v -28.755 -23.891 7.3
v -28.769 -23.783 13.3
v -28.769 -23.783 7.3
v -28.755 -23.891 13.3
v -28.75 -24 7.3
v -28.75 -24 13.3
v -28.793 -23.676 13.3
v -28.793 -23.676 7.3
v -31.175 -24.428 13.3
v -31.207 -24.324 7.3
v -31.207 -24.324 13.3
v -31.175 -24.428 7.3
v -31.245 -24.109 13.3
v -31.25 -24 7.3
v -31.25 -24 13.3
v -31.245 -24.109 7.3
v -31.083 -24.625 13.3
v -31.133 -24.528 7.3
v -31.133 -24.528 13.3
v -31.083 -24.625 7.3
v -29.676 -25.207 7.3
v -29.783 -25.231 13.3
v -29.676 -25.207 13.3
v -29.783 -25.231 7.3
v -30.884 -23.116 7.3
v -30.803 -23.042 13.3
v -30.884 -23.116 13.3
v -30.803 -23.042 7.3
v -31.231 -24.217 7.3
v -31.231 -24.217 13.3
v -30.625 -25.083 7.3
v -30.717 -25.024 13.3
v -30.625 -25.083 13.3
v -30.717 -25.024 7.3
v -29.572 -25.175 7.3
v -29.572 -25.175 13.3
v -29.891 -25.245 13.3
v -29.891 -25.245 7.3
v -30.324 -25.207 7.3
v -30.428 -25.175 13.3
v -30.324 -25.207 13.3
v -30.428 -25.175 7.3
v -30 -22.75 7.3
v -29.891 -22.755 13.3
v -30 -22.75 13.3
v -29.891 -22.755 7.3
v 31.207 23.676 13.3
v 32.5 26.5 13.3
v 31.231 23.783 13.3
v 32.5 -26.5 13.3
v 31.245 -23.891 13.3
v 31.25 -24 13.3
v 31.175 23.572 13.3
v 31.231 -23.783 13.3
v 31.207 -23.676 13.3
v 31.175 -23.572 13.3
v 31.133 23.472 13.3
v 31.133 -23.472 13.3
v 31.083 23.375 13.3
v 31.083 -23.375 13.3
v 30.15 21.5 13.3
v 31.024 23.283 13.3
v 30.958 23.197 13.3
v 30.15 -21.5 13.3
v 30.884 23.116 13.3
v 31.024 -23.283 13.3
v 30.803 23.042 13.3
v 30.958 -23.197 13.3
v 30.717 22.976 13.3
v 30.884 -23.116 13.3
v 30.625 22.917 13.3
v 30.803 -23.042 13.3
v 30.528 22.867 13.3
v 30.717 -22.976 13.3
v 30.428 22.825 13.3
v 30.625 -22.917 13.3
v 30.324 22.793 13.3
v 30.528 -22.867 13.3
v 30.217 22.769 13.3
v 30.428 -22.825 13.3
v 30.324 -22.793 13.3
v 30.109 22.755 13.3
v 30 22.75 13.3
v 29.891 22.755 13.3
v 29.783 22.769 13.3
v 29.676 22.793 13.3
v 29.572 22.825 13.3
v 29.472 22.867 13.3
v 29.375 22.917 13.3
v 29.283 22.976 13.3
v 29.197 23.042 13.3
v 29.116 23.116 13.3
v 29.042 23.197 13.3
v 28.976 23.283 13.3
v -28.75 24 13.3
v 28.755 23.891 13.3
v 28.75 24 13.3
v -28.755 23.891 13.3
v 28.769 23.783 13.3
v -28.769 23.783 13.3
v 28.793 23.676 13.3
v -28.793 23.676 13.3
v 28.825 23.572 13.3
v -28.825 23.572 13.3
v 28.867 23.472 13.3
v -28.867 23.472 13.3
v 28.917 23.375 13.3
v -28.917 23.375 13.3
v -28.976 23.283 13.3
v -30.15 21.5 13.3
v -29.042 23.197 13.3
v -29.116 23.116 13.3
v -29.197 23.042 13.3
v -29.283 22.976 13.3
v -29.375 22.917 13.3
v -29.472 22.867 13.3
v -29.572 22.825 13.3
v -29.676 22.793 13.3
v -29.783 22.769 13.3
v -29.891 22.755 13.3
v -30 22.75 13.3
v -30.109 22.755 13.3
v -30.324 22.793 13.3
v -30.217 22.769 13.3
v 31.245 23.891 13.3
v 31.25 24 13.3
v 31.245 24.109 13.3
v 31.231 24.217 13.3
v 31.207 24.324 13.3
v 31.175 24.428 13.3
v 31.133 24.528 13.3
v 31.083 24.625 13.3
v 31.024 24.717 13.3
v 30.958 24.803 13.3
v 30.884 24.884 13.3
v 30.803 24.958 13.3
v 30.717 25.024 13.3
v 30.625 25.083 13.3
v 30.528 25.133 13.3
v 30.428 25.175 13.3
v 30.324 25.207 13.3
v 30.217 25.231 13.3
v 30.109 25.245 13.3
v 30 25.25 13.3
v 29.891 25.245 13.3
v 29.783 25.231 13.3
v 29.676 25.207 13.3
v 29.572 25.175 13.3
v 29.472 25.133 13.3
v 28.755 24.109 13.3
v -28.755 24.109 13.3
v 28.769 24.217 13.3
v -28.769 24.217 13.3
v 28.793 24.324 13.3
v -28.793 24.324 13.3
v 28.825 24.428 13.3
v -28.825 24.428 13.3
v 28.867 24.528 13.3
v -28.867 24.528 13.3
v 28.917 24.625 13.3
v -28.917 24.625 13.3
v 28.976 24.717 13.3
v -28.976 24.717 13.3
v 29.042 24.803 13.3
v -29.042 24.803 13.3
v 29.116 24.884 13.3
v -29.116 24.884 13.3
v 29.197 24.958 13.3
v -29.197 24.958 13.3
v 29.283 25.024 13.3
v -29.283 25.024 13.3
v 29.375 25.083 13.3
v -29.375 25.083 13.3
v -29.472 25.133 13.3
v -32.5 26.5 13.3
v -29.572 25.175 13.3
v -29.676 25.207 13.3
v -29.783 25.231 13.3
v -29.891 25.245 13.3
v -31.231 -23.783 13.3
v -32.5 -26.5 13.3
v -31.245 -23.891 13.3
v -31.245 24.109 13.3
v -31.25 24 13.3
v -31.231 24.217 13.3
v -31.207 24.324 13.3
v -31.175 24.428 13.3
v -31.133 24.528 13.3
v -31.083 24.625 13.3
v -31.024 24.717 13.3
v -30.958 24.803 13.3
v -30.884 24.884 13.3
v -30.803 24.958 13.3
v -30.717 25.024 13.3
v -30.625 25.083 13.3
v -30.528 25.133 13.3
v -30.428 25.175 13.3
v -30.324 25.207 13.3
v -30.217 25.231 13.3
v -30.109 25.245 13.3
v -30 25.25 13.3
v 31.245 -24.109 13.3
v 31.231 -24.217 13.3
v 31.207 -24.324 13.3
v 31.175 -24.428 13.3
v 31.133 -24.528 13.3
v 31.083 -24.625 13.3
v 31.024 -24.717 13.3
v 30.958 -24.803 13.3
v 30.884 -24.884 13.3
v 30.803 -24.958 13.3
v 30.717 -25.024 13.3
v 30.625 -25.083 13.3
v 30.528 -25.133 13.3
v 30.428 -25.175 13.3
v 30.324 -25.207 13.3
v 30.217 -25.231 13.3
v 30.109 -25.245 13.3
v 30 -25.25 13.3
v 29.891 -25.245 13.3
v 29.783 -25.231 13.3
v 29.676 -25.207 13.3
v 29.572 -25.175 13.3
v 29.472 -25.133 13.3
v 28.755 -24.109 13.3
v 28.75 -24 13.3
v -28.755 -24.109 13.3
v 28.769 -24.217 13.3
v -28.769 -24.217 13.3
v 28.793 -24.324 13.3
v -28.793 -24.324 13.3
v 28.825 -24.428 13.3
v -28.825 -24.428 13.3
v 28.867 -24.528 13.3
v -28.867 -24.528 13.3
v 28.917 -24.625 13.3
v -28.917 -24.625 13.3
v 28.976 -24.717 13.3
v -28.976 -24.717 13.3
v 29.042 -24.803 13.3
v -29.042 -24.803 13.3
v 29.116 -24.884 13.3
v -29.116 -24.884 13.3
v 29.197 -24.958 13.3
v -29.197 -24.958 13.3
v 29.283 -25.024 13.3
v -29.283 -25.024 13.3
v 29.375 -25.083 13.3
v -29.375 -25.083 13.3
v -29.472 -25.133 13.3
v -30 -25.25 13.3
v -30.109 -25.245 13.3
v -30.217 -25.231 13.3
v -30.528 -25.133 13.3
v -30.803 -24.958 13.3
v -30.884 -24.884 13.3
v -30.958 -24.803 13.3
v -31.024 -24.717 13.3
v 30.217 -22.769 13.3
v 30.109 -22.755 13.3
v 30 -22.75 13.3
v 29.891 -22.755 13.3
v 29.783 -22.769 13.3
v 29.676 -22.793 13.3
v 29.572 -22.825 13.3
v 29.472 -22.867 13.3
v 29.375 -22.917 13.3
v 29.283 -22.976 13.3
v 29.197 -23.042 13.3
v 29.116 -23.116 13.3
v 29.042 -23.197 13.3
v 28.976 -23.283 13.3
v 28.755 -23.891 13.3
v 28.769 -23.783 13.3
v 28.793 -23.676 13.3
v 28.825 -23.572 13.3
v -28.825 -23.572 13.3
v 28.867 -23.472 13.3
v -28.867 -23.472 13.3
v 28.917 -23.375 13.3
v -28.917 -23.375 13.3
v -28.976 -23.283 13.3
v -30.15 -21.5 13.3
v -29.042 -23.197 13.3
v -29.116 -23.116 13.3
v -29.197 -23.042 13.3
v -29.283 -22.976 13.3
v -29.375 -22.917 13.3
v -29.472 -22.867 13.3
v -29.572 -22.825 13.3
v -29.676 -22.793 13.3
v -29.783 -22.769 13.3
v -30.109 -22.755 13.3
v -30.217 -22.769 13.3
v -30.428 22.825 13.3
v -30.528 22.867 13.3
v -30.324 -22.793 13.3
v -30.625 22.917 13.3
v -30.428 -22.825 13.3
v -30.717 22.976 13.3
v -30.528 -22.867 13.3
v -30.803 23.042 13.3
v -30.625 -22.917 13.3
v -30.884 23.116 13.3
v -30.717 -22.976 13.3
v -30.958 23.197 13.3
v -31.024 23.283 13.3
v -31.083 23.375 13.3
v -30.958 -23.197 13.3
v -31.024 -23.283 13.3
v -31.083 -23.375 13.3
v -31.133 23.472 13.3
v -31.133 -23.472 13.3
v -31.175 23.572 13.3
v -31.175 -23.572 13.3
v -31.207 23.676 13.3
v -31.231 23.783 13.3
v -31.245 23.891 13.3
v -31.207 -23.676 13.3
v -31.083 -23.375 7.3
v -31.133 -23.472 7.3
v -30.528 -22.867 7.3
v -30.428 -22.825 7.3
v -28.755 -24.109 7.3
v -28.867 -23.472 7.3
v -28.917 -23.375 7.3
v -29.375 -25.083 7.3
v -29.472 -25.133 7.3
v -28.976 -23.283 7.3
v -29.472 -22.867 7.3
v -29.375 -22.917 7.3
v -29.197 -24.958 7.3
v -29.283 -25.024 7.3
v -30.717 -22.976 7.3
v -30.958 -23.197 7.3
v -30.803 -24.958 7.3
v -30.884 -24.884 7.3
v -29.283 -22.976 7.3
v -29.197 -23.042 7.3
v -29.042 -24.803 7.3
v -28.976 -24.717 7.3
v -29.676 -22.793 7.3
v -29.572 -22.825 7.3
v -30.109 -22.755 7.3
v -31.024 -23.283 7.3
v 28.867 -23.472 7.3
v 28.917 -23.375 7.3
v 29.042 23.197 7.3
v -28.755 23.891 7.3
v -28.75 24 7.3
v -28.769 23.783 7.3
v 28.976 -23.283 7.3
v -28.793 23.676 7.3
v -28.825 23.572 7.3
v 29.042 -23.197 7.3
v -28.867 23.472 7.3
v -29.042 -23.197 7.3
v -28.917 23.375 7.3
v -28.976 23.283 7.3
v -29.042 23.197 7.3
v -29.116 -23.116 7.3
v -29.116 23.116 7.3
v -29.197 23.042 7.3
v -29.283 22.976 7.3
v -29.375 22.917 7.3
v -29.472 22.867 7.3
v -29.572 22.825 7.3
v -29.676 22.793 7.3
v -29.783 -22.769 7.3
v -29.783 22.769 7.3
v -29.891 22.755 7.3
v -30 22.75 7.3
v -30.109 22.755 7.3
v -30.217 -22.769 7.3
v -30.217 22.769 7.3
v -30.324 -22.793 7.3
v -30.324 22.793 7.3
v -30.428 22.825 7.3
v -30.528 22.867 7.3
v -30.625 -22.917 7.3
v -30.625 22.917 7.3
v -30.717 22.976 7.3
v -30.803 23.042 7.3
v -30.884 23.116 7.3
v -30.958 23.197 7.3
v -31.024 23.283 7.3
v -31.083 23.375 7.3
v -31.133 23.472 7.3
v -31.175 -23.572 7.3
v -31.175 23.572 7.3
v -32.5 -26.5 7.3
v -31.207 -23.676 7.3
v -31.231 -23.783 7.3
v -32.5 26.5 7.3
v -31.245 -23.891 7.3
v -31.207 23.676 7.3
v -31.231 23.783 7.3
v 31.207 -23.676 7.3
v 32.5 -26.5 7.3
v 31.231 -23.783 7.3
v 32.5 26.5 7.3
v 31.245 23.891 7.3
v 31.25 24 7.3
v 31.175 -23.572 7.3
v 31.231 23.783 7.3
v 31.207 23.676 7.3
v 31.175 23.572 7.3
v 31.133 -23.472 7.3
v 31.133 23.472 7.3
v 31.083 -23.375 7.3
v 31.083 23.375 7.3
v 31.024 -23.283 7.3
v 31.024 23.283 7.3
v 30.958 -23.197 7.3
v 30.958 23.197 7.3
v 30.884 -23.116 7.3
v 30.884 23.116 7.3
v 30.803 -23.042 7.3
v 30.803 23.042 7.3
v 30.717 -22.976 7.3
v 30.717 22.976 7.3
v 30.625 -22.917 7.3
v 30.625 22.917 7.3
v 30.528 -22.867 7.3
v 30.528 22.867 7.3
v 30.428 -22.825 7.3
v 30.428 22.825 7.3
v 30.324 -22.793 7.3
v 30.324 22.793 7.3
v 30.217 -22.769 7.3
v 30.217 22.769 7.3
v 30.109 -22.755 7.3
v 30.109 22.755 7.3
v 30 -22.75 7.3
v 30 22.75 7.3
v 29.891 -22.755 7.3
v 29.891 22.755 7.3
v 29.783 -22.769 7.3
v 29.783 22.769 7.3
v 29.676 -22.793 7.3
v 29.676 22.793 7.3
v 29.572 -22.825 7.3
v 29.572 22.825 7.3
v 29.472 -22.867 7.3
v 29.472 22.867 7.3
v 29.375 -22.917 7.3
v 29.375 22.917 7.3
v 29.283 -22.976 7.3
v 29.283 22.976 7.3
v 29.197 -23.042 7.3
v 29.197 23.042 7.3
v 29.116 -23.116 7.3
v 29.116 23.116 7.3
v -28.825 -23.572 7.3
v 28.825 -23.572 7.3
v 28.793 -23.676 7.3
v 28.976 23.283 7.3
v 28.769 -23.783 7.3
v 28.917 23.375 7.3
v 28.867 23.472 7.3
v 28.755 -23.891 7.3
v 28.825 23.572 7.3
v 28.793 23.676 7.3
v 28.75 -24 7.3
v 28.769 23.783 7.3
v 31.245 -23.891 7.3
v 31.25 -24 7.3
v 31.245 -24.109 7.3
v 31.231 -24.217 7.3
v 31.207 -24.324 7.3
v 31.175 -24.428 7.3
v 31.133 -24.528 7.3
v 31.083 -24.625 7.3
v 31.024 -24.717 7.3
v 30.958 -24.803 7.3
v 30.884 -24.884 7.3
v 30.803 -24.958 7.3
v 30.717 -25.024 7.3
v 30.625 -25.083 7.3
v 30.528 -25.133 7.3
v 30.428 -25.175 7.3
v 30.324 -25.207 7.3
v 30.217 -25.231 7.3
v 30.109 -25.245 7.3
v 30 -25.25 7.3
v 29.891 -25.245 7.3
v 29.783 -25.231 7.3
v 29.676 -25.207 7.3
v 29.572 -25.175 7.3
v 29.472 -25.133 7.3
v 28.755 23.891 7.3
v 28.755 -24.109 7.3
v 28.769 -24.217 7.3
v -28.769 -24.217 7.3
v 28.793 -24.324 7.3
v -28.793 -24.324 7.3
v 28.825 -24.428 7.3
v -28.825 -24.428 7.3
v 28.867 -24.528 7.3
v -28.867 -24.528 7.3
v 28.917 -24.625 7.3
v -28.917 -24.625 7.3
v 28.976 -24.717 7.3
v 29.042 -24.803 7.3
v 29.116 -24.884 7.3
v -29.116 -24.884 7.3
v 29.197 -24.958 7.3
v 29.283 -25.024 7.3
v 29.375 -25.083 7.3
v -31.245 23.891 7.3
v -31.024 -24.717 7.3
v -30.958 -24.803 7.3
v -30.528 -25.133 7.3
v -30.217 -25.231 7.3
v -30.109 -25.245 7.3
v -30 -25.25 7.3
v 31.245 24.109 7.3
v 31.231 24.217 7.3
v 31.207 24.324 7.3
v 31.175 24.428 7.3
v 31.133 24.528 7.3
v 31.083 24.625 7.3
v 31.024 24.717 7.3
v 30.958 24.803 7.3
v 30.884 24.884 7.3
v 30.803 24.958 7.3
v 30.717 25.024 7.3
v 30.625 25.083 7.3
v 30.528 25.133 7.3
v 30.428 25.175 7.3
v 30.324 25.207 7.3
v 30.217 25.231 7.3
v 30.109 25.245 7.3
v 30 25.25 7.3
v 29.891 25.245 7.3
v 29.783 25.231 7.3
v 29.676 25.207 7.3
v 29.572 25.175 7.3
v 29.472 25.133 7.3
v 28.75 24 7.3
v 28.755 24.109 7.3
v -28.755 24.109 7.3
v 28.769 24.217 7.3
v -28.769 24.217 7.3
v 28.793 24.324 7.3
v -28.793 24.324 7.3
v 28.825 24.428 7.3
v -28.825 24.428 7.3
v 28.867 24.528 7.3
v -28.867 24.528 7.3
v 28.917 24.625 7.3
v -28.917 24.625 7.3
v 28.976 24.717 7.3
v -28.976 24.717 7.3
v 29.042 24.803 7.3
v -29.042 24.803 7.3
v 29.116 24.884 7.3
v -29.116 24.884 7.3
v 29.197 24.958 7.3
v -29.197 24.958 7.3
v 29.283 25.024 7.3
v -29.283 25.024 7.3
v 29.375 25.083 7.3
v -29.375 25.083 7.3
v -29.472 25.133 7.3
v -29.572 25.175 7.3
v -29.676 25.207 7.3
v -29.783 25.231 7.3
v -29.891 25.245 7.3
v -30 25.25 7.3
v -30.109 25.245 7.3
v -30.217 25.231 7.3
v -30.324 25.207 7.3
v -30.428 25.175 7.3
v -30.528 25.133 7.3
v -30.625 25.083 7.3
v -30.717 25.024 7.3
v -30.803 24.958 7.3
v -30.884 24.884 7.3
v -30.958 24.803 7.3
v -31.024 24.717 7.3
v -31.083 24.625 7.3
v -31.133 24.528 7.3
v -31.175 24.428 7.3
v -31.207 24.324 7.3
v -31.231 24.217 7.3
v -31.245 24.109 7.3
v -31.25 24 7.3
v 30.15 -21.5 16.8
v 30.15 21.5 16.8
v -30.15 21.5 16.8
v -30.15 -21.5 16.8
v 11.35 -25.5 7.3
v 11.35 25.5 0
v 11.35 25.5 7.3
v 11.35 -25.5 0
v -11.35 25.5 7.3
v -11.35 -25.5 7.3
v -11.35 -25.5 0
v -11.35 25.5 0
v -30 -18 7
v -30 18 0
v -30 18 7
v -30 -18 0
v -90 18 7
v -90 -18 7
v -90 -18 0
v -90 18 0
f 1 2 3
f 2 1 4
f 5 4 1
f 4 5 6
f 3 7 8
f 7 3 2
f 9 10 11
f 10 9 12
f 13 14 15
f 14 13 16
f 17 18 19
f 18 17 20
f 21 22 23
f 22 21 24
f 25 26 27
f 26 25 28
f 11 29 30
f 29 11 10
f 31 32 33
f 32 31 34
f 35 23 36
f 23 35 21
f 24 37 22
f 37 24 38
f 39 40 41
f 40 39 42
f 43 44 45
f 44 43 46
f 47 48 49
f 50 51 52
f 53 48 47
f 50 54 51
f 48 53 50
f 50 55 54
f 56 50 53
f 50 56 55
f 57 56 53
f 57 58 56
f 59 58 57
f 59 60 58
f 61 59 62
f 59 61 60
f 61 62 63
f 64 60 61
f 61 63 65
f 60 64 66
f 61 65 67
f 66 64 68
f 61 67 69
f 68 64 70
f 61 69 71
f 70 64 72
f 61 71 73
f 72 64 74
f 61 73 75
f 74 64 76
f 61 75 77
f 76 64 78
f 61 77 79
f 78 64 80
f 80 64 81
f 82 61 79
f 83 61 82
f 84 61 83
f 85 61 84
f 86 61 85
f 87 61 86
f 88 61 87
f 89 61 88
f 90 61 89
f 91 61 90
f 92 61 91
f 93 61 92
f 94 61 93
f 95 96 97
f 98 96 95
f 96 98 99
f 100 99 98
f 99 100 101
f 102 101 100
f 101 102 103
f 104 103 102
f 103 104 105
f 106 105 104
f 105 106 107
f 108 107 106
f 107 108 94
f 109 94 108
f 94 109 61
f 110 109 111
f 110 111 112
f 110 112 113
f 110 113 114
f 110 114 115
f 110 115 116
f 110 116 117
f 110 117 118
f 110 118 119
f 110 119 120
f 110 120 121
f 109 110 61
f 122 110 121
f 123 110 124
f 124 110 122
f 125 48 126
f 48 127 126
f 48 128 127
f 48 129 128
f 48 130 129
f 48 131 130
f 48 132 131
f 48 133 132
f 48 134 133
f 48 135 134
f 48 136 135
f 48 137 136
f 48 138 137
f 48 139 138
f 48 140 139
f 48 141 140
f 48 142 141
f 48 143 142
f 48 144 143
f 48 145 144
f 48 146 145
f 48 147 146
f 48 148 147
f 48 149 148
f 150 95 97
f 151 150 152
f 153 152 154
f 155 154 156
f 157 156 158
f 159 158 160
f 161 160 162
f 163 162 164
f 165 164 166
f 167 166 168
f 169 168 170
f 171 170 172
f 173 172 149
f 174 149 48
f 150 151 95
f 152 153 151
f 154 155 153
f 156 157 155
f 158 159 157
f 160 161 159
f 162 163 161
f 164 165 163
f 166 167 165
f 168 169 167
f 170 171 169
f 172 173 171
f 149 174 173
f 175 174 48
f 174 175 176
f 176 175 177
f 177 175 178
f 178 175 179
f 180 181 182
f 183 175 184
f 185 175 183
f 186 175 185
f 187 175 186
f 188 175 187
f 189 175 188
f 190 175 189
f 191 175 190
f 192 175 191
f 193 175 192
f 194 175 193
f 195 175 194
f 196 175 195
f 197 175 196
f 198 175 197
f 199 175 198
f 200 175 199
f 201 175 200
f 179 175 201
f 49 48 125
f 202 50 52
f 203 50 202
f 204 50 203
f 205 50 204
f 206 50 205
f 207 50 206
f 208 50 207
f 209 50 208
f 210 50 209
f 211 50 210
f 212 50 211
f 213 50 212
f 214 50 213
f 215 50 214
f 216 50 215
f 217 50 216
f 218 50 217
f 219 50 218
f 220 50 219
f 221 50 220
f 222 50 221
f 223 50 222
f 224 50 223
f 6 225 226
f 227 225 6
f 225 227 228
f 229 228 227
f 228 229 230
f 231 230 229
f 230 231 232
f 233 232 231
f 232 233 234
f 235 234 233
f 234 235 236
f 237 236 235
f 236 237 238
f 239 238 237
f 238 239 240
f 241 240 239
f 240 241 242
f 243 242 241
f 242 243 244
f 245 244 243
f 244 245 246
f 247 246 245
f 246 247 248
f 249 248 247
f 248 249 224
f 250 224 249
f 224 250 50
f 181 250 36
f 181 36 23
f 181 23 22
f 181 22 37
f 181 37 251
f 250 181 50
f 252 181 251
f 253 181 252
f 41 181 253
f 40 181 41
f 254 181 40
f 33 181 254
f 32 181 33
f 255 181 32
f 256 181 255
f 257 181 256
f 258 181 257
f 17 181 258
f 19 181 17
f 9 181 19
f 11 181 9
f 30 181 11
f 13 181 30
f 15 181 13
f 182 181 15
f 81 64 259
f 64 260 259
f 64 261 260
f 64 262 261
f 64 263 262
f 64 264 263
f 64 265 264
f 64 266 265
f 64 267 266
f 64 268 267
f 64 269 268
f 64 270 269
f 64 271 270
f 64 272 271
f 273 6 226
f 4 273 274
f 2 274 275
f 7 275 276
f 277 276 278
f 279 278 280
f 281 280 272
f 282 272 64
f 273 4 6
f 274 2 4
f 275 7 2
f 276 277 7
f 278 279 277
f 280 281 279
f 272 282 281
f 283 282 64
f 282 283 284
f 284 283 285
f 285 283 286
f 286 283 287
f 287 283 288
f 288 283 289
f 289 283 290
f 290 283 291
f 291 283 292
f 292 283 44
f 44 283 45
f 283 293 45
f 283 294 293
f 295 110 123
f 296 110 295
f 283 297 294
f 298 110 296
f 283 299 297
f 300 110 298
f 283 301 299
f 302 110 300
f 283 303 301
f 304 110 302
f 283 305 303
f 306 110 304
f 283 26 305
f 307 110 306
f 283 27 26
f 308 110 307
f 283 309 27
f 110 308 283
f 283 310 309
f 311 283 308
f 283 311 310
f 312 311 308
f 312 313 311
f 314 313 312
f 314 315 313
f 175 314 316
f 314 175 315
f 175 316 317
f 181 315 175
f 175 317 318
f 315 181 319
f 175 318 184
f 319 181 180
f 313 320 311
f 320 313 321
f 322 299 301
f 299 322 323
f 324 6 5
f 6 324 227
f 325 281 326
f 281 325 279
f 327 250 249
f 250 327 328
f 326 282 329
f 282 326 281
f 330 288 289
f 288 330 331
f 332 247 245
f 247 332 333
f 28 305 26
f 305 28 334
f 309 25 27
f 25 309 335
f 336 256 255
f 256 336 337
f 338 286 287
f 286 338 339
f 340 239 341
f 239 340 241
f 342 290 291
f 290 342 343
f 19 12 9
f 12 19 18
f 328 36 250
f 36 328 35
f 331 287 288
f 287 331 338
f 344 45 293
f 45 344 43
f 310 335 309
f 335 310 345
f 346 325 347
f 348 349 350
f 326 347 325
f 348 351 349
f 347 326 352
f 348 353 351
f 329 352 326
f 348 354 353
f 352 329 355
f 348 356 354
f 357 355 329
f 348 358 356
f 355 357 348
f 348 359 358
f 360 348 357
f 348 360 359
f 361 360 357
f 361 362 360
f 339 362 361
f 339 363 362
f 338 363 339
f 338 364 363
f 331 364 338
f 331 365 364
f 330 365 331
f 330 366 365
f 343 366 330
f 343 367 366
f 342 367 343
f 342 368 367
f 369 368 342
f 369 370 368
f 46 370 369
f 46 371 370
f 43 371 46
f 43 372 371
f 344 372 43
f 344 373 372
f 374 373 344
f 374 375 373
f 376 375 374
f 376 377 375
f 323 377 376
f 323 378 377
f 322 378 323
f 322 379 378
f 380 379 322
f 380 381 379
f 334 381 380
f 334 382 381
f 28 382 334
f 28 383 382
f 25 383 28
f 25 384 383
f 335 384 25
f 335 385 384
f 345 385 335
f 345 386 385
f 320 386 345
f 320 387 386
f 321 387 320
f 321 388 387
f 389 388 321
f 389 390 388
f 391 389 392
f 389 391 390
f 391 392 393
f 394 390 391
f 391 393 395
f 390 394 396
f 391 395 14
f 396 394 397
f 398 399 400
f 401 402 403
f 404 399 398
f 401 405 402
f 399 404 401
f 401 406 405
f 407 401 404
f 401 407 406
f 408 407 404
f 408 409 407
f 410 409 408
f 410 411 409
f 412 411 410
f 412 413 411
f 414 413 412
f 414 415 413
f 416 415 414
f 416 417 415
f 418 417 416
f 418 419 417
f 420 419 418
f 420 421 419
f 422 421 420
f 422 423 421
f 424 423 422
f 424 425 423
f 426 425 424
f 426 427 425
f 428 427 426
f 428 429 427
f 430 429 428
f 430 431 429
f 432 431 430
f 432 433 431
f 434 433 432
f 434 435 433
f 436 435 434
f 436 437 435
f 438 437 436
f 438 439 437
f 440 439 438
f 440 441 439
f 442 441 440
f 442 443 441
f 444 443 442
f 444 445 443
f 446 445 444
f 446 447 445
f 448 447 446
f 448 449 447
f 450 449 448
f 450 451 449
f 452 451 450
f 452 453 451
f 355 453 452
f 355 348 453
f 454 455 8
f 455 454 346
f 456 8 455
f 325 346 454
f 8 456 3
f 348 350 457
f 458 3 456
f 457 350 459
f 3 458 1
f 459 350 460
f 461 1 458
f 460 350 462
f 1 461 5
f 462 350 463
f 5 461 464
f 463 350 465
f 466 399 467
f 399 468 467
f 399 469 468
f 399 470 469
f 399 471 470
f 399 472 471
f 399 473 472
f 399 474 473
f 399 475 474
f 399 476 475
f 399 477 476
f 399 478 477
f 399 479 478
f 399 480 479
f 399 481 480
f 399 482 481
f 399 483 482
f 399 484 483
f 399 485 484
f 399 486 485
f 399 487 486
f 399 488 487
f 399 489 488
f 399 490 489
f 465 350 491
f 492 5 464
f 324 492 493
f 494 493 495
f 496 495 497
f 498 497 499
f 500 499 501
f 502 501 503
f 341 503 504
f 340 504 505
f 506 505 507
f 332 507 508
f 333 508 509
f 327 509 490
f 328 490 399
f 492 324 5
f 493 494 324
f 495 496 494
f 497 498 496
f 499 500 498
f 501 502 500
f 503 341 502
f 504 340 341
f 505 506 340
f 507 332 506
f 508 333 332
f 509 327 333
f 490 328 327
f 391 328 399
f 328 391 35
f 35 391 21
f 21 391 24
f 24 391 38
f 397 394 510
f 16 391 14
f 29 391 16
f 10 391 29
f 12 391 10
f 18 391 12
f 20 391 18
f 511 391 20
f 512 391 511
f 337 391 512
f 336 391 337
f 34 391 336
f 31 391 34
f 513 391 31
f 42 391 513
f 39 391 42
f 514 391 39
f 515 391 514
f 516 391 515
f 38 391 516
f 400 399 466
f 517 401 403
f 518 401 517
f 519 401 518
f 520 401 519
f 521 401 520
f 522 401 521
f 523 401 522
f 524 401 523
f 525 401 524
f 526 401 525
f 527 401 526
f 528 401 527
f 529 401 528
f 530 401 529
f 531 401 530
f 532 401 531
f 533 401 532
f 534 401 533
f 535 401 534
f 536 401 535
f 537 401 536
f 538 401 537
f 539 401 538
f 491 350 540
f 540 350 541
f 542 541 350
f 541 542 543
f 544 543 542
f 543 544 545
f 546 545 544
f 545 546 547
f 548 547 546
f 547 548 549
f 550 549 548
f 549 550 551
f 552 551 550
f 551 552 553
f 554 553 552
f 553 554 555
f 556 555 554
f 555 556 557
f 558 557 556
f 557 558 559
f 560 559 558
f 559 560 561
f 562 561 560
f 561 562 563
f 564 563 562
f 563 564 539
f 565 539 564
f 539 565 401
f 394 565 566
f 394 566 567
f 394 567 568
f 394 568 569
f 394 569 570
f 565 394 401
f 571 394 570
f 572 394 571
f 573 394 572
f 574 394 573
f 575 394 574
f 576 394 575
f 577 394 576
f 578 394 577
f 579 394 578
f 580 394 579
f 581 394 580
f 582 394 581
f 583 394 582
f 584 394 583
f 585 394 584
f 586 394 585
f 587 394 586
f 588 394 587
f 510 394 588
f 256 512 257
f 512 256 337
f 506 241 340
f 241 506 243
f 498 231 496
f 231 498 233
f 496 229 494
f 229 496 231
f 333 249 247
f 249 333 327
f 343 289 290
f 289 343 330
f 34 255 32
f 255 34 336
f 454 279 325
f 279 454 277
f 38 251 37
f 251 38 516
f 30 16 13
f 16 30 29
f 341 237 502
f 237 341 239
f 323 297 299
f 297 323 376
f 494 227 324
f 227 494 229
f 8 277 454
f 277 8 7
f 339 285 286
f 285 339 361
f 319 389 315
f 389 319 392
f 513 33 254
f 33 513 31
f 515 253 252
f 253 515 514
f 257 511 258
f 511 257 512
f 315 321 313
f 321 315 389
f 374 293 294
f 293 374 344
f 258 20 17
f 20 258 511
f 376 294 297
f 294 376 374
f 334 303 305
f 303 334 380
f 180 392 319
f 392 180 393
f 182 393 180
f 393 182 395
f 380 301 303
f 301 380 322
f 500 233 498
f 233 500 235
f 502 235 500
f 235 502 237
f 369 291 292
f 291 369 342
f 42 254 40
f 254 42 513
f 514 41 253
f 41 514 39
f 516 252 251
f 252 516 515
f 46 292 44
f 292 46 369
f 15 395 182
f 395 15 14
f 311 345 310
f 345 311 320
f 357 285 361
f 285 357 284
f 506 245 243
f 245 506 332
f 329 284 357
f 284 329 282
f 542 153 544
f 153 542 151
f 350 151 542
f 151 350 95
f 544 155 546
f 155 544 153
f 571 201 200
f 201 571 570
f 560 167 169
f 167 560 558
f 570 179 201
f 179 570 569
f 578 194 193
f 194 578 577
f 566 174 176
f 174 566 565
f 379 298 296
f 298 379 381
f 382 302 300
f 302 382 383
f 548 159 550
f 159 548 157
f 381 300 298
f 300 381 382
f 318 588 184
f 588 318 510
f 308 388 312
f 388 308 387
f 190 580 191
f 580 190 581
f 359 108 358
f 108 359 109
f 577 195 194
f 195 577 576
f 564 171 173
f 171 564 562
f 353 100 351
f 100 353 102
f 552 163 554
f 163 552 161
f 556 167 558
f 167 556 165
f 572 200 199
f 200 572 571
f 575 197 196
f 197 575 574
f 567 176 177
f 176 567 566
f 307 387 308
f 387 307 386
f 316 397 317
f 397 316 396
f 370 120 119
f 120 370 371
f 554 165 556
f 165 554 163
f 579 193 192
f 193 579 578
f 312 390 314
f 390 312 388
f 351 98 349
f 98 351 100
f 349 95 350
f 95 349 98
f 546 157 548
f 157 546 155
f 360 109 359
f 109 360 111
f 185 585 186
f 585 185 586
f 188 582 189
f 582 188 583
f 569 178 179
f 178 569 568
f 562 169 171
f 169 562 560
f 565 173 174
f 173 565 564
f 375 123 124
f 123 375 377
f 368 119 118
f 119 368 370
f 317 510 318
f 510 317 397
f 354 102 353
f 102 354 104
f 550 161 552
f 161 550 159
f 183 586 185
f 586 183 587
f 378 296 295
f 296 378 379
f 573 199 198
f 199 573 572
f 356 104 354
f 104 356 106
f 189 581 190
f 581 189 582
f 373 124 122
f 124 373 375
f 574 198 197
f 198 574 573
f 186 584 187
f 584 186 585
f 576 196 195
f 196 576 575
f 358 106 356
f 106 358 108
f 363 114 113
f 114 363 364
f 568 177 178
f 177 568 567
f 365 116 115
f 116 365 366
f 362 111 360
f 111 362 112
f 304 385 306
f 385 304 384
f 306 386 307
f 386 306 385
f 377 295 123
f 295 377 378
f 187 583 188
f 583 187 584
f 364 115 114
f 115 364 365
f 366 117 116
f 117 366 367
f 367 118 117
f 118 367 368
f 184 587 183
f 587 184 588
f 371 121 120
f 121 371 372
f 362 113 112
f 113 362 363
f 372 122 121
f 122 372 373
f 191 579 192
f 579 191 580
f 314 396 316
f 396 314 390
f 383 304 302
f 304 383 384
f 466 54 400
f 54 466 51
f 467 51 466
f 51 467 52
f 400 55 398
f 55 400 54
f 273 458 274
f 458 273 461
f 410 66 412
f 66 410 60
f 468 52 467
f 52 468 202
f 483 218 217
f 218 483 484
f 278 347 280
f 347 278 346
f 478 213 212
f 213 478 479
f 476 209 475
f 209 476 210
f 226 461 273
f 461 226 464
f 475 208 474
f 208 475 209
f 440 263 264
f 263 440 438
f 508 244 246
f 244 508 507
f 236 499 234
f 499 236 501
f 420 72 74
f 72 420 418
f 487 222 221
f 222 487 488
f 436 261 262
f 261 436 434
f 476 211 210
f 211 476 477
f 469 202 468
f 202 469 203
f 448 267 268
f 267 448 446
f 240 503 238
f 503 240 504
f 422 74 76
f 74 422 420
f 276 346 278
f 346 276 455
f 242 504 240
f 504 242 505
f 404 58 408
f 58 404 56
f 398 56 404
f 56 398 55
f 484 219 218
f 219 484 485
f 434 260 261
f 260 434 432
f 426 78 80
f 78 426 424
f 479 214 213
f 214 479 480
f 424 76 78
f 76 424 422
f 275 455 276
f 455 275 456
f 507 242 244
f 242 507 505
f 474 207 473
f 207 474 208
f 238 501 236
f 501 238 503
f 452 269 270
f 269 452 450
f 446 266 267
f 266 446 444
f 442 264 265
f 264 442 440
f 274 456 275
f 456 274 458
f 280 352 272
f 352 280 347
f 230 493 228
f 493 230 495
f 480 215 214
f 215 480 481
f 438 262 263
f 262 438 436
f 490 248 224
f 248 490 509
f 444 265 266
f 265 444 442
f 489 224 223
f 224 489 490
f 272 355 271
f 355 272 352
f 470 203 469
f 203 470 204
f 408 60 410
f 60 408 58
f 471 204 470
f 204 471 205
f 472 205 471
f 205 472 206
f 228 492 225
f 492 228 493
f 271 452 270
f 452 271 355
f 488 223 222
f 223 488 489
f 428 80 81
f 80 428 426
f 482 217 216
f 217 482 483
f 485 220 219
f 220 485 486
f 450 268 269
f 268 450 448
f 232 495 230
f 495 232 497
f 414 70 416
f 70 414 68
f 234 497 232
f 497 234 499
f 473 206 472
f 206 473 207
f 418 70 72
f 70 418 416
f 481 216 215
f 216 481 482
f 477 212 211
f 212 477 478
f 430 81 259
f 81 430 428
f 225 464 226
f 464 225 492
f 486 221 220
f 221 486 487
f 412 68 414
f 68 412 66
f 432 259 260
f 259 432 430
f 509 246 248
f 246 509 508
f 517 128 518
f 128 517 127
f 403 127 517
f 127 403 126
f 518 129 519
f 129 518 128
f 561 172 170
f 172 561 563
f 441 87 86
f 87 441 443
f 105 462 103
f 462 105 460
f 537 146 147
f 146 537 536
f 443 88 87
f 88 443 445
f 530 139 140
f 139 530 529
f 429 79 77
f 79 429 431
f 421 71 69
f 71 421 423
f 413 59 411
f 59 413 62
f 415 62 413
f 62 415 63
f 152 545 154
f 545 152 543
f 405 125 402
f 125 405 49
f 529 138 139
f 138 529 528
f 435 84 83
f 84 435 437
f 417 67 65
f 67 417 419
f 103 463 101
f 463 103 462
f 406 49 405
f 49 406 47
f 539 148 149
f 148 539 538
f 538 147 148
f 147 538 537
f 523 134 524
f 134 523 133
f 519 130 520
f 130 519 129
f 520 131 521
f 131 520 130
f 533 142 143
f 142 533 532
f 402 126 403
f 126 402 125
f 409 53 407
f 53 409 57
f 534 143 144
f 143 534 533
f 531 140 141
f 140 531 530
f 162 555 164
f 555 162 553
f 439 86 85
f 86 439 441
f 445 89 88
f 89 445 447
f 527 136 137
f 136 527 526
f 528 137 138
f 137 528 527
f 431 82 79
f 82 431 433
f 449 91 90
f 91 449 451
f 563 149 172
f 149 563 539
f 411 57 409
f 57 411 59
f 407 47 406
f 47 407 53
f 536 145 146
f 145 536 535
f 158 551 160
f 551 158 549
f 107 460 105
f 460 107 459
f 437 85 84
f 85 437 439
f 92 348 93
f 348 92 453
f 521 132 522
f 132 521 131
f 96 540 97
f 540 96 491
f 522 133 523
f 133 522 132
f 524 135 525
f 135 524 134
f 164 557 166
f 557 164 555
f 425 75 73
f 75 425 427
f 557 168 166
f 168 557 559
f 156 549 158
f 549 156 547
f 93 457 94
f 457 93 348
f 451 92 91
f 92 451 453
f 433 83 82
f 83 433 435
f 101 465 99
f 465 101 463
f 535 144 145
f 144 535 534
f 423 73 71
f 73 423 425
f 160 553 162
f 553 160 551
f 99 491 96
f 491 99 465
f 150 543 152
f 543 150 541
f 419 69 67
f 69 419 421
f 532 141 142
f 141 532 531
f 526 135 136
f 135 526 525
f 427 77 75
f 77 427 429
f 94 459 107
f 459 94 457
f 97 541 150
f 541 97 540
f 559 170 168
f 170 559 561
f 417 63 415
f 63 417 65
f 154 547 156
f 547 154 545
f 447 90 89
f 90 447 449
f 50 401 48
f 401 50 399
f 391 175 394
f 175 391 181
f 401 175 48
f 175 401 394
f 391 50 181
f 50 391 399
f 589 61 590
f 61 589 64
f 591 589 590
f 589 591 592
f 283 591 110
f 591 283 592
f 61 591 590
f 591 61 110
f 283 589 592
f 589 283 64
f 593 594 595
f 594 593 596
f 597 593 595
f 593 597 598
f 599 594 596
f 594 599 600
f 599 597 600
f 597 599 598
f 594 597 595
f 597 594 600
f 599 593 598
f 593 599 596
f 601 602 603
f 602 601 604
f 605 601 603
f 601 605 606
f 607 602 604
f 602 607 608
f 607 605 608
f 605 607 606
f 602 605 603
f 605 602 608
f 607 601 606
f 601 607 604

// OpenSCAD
$fn = 72;

feather();

translate([0, 0, 7.3])
tft_featherwing_24();

translate([-60, 0, 0])
battery_2000mah();

module tft_featherwing_24()
{
    color("blue")
    translate([0, 0, 6/2])
    difference()
    {
        cube([65, 53, 6], center=true);
        
    
        for (xOff = [-30, 30])
        {
            for (yOff = [-24, 24])
            {
                translate([xOff, yOff, 0])
                cylinder(d=2.5, h=6, center=true);
            }
        }
    }
    
    color("black")
    translate([0, 0, 6 + 3.5/2])
    cube([60.3, 43, 3.5], center=true);
}

module feather()
{
    color("black")
    translate([0, 0, 7.3/2])
    cube([22.7, 51, 7.3], center=true);
}

module battery_2000mah()
{
    color("silver")
    translate([0, 0, 7/2])
    cube([60, 36, 7], center=true);
}
